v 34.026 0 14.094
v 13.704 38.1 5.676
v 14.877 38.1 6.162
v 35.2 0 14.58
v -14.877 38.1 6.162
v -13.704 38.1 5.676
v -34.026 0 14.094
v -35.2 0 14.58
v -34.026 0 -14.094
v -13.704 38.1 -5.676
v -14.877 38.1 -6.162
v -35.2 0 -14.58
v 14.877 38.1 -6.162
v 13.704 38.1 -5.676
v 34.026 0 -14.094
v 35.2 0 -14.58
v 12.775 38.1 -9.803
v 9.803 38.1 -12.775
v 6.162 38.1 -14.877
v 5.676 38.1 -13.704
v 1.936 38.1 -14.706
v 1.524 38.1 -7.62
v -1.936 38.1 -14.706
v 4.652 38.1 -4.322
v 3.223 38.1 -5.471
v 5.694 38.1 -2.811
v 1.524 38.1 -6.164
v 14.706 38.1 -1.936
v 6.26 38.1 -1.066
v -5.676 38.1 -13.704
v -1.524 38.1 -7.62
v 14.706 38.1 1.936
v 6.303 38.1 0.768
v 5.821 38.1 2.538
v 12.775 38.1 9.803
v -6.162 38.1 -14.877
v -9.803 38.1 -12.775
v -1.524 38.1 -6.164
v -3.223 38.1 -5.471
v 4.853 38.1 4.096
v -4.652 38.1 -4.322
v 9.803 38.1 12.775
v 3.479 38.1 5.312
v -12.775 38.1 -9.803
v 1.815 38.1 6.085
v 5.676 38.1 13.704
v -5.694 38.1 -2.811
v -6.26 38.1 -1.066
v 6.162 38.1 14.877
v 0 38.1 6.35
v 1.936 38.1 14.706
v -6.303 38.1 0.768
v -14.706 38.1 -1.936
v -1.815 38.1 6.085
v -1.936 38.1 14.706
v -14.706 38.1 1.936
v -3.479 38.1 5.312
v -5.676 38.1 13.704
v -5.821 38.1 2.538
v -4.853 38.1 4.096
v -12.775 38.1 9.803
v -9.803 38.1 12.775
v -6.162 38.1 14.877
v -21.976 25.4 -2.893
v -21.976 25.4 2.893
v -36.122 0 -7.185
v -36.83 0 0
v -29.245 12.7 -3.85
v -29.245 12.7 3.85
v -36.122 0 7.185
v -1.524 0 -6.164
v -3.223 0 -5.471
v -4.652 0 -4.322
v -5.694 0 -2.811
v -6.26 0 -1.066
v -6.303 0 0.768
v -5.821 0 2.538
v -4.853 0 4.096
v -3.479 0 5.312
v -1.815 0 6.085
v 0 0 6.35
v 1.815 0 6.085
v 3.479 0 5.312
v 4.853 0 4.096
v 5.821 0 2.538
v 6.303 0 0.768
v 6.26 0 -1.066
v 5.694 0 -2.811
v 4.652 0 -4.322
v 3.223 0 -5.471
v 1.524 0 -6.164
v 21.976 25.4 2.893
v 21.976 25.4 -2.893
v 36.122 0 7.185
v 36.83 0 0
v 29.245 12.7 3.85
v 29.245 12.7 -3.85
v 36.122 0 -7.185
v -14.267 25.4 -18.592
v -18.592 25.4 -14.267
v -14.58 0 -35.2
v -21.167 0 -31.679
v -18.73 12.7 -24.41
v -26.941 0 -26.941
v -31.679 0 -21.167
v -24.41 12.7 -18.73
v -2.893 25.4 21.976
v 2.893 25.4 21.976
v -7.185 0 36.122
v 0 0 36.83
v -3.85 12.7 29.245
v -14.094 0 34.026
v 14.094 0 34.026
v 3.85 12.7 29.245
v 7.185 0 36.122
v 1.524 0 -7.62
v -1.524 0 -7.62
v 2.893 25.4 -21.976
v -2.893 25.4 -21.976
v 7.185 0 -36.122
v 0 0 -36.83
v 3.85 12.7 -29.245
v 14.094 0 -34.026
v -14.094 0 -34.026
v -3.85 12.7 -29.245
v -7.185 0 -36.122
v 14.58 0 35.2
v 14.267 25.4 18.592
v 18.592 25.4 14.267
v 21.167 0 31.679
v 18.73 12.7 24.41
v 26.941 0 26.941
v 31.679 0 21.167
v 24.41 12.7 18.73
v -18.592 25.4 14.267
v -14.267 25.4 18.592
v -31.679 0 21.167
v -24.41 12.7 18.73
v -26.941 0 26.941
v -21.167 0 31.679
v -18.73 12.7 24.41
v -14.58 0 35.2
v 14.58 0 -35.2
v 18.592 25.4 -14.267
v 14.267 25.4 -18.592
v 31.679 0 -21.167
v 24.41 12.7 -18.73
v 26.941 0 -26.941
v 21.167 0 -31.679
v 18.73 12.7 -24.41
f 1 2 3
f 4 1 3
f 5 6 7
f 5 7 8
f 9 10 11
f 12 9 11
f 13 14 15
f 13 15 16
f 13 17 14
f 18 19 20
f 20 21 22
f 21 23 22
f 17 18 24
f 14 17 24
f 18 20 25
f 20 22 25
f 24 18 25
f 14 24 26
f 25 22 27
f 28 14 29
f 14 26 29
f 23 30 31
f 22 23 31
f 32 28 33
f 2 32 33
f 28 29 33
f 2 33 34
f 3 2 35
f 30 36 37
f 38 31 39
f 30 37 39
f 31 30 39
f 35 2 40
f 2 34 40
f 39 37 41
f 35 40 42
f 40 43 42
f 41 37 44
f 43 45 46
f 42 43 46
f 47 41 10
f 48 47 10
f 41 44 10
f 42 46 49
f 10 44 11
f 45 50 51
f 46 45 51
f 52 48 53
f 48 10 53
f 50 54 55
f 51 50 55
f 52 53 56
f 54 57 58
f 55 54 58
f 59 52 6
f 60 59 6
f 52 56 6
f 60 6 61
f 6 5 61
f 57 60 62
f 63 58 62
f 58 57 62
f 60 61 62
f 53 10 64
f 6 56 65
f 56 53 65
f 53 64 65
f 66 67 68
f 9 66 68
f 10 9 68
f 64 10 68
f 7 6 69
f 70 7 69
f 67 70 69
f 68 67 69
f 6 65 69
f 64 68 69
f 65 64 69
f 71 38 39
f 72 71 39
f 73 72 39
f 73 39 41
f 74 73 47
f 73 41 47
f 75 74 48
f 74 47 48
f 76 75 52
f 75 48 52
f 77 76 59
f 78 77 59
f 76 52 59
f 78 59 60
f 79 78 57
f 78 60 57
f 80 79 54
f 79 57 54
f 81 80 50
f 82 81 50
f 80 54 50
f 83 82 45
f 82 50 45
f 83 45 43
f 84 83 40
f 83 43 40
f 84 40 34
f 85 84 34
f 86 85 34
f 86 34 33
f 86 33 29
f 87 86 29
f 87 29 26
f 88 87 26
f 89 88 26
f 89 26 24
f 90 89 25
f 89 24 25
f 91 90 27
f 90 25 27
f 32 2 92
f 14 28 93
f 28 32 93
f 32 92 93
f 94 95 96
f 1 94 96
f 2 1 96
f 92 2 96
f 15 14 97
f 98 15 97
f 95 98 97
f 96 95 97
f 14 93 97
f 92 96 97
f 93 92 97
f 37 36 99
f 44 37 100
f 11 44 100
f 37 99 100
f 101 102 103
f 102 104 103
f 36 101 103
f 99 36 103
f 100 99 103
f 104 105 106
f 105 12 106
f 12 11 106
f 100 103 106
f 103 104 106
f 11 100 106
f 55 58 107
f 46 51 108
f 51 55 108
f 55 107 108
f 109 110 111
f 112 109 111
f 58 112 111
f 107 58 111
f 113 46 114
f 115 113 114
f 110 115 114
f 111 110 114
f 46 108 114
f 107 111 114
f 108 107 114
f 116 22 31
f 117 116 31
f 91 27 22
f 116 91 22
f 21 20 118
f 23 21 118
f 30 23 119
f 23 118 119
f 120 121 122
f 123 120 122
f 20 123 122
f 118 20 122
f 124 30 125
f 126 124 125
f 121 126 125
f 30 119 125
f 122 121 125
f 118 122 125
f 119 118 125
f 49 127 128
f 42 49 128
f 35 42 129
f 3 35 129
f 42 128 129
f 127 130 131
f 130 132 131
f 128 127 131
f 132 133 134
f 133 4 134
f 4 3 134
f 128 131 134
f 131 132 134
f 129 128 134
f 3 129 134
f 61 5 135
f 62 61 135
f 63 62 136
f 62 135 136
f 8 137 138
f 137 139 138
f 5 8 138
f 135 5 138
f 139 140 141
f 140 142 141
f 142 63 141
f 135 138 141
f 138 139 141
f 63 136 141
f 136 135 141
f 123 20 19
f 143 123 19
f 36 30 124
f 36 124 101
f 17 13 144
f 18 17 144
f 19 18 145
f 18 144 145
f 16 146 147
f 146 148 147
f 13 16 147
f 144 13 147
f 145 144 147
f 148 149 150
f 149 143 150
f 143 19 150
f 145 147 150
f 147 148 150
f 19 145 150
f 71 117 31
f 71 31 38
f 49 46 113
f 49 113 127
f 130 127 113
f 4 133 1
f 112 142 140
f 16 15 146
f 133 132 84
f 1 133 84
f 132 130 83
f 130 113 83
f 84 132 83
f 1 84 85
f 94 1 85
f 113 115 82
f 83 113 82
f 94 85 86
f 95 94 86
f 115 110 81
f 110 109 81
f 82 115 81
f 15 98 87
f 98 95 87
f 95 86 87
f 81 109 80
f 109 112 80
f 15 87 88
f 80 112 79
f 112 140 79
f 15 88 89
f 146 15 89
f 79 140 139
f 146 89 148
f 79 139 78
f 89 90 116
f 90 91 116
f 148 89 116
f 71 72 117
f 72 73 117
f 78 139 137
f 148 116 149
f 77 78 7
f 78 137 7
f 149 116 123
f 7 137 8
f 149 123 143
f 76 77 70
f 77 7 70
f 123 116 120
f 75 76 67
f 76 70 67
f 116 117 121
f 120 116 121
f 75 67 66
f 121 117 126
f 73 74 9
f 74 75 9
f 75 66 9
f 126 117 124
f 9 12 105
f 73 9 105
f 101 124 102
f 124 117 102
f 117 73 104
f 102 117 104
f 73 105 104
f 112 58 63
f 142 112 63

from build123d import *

# Parameters (mm, degrees)
CUT_EXTRUDE1_DEPTH      = 66.991135768
CUT_EXTRUDE1_DEPTH_BACK = 66.991135768
CUT_REVOLVE1_ANGLE      = 45
CIRPATTERN1_COUNT       = 4


with BuildPart() as part:
    # Sketch1 → Revolve1 (revolve)
    with BuildSketch(Plane.XY, mode=Mode.PRIVATE) as revolve1_sk:
        Polygon((6.35, 0), (6.35, 38.1), (16.102954744, 38.1), (38.1, 0), align=None)
    revolve(revolve1_sk.sketch.rotate(Axis((0, 0, 0), (0, 1, 0)), 90), axis=Axis((0, 0, 0), (0, 1, 0)))

    # Sketch2 → Cut-Extrude1 (cut, two sides: drawn at the far end of the back side and taken through both)
    with BuildSketch(Plane(origin=(0, 38.1, 0), x_dir=(1, 0, 0), z_dir=(0, 1, 0)).offset(-CUT_EXTRUDE1_DEPTH_BACK)):
        with BuildLine():
            Line((1.524, 7.62), (-1.524, 7.62))
            Line((-1.524, 7.62), (-1.524, 6.164407839))
            ThreePointArc((-1.524, 6.164407839), (0, 6.35), (1.524, 6.164407839))
            Line((1.524, 6.164407839), (1.524, 7.62))
        make_face()
    extrude(amount=CUT_EXTRUDE1_DEPTH + CUT_EXTRUDE1_DEPTH_BACK, mode=Mode.SUBTRACT)

    # Sketch3 → Cut-Revolve1 (revolve, symmetric, cut)
    with BuildSketch(Plane(origin=(0, 0, 0), x_dir=(0, 0, -1), z_dir=(1, 0, 0))) as cut_revolve1_sk:
        Polygon((16.102954744, 38.1), (14.832954744, 38.1), (36.83, 0), (38.1, 0), align=None)
    cut_revolve1 = revolve(axis=Axis((0, 0, 0), (0, 1, 0)), revolution_arc=CUT_REVOLVE1_ANGLE / 2, mode=Mode.SUBTRACT)
    cut_revolve1 = cut_revolve1 + revolve(cut_revolve1_sk.sketch, axis=Axis((0, 0, 0), (0, -1, 0)), revolution_arc=CUT_REVOLVE1_ANGLE / 2, mode=Mode.SUBTRACT)

    # CirPattern1: Cut-Revolve1 ×4 about axis
    cirpattern1_axis = Axis((0, 38.1, 0), (0, -1, 0))
    for i in range(1, CIRPATTERN1_COUNT):
        add(cut_revolve1.rotate(cirpattern1_axis, i * 360 / CIRPATTERN1_COUNT), mode=Mode.SUBTRACT)


solid = part.part
